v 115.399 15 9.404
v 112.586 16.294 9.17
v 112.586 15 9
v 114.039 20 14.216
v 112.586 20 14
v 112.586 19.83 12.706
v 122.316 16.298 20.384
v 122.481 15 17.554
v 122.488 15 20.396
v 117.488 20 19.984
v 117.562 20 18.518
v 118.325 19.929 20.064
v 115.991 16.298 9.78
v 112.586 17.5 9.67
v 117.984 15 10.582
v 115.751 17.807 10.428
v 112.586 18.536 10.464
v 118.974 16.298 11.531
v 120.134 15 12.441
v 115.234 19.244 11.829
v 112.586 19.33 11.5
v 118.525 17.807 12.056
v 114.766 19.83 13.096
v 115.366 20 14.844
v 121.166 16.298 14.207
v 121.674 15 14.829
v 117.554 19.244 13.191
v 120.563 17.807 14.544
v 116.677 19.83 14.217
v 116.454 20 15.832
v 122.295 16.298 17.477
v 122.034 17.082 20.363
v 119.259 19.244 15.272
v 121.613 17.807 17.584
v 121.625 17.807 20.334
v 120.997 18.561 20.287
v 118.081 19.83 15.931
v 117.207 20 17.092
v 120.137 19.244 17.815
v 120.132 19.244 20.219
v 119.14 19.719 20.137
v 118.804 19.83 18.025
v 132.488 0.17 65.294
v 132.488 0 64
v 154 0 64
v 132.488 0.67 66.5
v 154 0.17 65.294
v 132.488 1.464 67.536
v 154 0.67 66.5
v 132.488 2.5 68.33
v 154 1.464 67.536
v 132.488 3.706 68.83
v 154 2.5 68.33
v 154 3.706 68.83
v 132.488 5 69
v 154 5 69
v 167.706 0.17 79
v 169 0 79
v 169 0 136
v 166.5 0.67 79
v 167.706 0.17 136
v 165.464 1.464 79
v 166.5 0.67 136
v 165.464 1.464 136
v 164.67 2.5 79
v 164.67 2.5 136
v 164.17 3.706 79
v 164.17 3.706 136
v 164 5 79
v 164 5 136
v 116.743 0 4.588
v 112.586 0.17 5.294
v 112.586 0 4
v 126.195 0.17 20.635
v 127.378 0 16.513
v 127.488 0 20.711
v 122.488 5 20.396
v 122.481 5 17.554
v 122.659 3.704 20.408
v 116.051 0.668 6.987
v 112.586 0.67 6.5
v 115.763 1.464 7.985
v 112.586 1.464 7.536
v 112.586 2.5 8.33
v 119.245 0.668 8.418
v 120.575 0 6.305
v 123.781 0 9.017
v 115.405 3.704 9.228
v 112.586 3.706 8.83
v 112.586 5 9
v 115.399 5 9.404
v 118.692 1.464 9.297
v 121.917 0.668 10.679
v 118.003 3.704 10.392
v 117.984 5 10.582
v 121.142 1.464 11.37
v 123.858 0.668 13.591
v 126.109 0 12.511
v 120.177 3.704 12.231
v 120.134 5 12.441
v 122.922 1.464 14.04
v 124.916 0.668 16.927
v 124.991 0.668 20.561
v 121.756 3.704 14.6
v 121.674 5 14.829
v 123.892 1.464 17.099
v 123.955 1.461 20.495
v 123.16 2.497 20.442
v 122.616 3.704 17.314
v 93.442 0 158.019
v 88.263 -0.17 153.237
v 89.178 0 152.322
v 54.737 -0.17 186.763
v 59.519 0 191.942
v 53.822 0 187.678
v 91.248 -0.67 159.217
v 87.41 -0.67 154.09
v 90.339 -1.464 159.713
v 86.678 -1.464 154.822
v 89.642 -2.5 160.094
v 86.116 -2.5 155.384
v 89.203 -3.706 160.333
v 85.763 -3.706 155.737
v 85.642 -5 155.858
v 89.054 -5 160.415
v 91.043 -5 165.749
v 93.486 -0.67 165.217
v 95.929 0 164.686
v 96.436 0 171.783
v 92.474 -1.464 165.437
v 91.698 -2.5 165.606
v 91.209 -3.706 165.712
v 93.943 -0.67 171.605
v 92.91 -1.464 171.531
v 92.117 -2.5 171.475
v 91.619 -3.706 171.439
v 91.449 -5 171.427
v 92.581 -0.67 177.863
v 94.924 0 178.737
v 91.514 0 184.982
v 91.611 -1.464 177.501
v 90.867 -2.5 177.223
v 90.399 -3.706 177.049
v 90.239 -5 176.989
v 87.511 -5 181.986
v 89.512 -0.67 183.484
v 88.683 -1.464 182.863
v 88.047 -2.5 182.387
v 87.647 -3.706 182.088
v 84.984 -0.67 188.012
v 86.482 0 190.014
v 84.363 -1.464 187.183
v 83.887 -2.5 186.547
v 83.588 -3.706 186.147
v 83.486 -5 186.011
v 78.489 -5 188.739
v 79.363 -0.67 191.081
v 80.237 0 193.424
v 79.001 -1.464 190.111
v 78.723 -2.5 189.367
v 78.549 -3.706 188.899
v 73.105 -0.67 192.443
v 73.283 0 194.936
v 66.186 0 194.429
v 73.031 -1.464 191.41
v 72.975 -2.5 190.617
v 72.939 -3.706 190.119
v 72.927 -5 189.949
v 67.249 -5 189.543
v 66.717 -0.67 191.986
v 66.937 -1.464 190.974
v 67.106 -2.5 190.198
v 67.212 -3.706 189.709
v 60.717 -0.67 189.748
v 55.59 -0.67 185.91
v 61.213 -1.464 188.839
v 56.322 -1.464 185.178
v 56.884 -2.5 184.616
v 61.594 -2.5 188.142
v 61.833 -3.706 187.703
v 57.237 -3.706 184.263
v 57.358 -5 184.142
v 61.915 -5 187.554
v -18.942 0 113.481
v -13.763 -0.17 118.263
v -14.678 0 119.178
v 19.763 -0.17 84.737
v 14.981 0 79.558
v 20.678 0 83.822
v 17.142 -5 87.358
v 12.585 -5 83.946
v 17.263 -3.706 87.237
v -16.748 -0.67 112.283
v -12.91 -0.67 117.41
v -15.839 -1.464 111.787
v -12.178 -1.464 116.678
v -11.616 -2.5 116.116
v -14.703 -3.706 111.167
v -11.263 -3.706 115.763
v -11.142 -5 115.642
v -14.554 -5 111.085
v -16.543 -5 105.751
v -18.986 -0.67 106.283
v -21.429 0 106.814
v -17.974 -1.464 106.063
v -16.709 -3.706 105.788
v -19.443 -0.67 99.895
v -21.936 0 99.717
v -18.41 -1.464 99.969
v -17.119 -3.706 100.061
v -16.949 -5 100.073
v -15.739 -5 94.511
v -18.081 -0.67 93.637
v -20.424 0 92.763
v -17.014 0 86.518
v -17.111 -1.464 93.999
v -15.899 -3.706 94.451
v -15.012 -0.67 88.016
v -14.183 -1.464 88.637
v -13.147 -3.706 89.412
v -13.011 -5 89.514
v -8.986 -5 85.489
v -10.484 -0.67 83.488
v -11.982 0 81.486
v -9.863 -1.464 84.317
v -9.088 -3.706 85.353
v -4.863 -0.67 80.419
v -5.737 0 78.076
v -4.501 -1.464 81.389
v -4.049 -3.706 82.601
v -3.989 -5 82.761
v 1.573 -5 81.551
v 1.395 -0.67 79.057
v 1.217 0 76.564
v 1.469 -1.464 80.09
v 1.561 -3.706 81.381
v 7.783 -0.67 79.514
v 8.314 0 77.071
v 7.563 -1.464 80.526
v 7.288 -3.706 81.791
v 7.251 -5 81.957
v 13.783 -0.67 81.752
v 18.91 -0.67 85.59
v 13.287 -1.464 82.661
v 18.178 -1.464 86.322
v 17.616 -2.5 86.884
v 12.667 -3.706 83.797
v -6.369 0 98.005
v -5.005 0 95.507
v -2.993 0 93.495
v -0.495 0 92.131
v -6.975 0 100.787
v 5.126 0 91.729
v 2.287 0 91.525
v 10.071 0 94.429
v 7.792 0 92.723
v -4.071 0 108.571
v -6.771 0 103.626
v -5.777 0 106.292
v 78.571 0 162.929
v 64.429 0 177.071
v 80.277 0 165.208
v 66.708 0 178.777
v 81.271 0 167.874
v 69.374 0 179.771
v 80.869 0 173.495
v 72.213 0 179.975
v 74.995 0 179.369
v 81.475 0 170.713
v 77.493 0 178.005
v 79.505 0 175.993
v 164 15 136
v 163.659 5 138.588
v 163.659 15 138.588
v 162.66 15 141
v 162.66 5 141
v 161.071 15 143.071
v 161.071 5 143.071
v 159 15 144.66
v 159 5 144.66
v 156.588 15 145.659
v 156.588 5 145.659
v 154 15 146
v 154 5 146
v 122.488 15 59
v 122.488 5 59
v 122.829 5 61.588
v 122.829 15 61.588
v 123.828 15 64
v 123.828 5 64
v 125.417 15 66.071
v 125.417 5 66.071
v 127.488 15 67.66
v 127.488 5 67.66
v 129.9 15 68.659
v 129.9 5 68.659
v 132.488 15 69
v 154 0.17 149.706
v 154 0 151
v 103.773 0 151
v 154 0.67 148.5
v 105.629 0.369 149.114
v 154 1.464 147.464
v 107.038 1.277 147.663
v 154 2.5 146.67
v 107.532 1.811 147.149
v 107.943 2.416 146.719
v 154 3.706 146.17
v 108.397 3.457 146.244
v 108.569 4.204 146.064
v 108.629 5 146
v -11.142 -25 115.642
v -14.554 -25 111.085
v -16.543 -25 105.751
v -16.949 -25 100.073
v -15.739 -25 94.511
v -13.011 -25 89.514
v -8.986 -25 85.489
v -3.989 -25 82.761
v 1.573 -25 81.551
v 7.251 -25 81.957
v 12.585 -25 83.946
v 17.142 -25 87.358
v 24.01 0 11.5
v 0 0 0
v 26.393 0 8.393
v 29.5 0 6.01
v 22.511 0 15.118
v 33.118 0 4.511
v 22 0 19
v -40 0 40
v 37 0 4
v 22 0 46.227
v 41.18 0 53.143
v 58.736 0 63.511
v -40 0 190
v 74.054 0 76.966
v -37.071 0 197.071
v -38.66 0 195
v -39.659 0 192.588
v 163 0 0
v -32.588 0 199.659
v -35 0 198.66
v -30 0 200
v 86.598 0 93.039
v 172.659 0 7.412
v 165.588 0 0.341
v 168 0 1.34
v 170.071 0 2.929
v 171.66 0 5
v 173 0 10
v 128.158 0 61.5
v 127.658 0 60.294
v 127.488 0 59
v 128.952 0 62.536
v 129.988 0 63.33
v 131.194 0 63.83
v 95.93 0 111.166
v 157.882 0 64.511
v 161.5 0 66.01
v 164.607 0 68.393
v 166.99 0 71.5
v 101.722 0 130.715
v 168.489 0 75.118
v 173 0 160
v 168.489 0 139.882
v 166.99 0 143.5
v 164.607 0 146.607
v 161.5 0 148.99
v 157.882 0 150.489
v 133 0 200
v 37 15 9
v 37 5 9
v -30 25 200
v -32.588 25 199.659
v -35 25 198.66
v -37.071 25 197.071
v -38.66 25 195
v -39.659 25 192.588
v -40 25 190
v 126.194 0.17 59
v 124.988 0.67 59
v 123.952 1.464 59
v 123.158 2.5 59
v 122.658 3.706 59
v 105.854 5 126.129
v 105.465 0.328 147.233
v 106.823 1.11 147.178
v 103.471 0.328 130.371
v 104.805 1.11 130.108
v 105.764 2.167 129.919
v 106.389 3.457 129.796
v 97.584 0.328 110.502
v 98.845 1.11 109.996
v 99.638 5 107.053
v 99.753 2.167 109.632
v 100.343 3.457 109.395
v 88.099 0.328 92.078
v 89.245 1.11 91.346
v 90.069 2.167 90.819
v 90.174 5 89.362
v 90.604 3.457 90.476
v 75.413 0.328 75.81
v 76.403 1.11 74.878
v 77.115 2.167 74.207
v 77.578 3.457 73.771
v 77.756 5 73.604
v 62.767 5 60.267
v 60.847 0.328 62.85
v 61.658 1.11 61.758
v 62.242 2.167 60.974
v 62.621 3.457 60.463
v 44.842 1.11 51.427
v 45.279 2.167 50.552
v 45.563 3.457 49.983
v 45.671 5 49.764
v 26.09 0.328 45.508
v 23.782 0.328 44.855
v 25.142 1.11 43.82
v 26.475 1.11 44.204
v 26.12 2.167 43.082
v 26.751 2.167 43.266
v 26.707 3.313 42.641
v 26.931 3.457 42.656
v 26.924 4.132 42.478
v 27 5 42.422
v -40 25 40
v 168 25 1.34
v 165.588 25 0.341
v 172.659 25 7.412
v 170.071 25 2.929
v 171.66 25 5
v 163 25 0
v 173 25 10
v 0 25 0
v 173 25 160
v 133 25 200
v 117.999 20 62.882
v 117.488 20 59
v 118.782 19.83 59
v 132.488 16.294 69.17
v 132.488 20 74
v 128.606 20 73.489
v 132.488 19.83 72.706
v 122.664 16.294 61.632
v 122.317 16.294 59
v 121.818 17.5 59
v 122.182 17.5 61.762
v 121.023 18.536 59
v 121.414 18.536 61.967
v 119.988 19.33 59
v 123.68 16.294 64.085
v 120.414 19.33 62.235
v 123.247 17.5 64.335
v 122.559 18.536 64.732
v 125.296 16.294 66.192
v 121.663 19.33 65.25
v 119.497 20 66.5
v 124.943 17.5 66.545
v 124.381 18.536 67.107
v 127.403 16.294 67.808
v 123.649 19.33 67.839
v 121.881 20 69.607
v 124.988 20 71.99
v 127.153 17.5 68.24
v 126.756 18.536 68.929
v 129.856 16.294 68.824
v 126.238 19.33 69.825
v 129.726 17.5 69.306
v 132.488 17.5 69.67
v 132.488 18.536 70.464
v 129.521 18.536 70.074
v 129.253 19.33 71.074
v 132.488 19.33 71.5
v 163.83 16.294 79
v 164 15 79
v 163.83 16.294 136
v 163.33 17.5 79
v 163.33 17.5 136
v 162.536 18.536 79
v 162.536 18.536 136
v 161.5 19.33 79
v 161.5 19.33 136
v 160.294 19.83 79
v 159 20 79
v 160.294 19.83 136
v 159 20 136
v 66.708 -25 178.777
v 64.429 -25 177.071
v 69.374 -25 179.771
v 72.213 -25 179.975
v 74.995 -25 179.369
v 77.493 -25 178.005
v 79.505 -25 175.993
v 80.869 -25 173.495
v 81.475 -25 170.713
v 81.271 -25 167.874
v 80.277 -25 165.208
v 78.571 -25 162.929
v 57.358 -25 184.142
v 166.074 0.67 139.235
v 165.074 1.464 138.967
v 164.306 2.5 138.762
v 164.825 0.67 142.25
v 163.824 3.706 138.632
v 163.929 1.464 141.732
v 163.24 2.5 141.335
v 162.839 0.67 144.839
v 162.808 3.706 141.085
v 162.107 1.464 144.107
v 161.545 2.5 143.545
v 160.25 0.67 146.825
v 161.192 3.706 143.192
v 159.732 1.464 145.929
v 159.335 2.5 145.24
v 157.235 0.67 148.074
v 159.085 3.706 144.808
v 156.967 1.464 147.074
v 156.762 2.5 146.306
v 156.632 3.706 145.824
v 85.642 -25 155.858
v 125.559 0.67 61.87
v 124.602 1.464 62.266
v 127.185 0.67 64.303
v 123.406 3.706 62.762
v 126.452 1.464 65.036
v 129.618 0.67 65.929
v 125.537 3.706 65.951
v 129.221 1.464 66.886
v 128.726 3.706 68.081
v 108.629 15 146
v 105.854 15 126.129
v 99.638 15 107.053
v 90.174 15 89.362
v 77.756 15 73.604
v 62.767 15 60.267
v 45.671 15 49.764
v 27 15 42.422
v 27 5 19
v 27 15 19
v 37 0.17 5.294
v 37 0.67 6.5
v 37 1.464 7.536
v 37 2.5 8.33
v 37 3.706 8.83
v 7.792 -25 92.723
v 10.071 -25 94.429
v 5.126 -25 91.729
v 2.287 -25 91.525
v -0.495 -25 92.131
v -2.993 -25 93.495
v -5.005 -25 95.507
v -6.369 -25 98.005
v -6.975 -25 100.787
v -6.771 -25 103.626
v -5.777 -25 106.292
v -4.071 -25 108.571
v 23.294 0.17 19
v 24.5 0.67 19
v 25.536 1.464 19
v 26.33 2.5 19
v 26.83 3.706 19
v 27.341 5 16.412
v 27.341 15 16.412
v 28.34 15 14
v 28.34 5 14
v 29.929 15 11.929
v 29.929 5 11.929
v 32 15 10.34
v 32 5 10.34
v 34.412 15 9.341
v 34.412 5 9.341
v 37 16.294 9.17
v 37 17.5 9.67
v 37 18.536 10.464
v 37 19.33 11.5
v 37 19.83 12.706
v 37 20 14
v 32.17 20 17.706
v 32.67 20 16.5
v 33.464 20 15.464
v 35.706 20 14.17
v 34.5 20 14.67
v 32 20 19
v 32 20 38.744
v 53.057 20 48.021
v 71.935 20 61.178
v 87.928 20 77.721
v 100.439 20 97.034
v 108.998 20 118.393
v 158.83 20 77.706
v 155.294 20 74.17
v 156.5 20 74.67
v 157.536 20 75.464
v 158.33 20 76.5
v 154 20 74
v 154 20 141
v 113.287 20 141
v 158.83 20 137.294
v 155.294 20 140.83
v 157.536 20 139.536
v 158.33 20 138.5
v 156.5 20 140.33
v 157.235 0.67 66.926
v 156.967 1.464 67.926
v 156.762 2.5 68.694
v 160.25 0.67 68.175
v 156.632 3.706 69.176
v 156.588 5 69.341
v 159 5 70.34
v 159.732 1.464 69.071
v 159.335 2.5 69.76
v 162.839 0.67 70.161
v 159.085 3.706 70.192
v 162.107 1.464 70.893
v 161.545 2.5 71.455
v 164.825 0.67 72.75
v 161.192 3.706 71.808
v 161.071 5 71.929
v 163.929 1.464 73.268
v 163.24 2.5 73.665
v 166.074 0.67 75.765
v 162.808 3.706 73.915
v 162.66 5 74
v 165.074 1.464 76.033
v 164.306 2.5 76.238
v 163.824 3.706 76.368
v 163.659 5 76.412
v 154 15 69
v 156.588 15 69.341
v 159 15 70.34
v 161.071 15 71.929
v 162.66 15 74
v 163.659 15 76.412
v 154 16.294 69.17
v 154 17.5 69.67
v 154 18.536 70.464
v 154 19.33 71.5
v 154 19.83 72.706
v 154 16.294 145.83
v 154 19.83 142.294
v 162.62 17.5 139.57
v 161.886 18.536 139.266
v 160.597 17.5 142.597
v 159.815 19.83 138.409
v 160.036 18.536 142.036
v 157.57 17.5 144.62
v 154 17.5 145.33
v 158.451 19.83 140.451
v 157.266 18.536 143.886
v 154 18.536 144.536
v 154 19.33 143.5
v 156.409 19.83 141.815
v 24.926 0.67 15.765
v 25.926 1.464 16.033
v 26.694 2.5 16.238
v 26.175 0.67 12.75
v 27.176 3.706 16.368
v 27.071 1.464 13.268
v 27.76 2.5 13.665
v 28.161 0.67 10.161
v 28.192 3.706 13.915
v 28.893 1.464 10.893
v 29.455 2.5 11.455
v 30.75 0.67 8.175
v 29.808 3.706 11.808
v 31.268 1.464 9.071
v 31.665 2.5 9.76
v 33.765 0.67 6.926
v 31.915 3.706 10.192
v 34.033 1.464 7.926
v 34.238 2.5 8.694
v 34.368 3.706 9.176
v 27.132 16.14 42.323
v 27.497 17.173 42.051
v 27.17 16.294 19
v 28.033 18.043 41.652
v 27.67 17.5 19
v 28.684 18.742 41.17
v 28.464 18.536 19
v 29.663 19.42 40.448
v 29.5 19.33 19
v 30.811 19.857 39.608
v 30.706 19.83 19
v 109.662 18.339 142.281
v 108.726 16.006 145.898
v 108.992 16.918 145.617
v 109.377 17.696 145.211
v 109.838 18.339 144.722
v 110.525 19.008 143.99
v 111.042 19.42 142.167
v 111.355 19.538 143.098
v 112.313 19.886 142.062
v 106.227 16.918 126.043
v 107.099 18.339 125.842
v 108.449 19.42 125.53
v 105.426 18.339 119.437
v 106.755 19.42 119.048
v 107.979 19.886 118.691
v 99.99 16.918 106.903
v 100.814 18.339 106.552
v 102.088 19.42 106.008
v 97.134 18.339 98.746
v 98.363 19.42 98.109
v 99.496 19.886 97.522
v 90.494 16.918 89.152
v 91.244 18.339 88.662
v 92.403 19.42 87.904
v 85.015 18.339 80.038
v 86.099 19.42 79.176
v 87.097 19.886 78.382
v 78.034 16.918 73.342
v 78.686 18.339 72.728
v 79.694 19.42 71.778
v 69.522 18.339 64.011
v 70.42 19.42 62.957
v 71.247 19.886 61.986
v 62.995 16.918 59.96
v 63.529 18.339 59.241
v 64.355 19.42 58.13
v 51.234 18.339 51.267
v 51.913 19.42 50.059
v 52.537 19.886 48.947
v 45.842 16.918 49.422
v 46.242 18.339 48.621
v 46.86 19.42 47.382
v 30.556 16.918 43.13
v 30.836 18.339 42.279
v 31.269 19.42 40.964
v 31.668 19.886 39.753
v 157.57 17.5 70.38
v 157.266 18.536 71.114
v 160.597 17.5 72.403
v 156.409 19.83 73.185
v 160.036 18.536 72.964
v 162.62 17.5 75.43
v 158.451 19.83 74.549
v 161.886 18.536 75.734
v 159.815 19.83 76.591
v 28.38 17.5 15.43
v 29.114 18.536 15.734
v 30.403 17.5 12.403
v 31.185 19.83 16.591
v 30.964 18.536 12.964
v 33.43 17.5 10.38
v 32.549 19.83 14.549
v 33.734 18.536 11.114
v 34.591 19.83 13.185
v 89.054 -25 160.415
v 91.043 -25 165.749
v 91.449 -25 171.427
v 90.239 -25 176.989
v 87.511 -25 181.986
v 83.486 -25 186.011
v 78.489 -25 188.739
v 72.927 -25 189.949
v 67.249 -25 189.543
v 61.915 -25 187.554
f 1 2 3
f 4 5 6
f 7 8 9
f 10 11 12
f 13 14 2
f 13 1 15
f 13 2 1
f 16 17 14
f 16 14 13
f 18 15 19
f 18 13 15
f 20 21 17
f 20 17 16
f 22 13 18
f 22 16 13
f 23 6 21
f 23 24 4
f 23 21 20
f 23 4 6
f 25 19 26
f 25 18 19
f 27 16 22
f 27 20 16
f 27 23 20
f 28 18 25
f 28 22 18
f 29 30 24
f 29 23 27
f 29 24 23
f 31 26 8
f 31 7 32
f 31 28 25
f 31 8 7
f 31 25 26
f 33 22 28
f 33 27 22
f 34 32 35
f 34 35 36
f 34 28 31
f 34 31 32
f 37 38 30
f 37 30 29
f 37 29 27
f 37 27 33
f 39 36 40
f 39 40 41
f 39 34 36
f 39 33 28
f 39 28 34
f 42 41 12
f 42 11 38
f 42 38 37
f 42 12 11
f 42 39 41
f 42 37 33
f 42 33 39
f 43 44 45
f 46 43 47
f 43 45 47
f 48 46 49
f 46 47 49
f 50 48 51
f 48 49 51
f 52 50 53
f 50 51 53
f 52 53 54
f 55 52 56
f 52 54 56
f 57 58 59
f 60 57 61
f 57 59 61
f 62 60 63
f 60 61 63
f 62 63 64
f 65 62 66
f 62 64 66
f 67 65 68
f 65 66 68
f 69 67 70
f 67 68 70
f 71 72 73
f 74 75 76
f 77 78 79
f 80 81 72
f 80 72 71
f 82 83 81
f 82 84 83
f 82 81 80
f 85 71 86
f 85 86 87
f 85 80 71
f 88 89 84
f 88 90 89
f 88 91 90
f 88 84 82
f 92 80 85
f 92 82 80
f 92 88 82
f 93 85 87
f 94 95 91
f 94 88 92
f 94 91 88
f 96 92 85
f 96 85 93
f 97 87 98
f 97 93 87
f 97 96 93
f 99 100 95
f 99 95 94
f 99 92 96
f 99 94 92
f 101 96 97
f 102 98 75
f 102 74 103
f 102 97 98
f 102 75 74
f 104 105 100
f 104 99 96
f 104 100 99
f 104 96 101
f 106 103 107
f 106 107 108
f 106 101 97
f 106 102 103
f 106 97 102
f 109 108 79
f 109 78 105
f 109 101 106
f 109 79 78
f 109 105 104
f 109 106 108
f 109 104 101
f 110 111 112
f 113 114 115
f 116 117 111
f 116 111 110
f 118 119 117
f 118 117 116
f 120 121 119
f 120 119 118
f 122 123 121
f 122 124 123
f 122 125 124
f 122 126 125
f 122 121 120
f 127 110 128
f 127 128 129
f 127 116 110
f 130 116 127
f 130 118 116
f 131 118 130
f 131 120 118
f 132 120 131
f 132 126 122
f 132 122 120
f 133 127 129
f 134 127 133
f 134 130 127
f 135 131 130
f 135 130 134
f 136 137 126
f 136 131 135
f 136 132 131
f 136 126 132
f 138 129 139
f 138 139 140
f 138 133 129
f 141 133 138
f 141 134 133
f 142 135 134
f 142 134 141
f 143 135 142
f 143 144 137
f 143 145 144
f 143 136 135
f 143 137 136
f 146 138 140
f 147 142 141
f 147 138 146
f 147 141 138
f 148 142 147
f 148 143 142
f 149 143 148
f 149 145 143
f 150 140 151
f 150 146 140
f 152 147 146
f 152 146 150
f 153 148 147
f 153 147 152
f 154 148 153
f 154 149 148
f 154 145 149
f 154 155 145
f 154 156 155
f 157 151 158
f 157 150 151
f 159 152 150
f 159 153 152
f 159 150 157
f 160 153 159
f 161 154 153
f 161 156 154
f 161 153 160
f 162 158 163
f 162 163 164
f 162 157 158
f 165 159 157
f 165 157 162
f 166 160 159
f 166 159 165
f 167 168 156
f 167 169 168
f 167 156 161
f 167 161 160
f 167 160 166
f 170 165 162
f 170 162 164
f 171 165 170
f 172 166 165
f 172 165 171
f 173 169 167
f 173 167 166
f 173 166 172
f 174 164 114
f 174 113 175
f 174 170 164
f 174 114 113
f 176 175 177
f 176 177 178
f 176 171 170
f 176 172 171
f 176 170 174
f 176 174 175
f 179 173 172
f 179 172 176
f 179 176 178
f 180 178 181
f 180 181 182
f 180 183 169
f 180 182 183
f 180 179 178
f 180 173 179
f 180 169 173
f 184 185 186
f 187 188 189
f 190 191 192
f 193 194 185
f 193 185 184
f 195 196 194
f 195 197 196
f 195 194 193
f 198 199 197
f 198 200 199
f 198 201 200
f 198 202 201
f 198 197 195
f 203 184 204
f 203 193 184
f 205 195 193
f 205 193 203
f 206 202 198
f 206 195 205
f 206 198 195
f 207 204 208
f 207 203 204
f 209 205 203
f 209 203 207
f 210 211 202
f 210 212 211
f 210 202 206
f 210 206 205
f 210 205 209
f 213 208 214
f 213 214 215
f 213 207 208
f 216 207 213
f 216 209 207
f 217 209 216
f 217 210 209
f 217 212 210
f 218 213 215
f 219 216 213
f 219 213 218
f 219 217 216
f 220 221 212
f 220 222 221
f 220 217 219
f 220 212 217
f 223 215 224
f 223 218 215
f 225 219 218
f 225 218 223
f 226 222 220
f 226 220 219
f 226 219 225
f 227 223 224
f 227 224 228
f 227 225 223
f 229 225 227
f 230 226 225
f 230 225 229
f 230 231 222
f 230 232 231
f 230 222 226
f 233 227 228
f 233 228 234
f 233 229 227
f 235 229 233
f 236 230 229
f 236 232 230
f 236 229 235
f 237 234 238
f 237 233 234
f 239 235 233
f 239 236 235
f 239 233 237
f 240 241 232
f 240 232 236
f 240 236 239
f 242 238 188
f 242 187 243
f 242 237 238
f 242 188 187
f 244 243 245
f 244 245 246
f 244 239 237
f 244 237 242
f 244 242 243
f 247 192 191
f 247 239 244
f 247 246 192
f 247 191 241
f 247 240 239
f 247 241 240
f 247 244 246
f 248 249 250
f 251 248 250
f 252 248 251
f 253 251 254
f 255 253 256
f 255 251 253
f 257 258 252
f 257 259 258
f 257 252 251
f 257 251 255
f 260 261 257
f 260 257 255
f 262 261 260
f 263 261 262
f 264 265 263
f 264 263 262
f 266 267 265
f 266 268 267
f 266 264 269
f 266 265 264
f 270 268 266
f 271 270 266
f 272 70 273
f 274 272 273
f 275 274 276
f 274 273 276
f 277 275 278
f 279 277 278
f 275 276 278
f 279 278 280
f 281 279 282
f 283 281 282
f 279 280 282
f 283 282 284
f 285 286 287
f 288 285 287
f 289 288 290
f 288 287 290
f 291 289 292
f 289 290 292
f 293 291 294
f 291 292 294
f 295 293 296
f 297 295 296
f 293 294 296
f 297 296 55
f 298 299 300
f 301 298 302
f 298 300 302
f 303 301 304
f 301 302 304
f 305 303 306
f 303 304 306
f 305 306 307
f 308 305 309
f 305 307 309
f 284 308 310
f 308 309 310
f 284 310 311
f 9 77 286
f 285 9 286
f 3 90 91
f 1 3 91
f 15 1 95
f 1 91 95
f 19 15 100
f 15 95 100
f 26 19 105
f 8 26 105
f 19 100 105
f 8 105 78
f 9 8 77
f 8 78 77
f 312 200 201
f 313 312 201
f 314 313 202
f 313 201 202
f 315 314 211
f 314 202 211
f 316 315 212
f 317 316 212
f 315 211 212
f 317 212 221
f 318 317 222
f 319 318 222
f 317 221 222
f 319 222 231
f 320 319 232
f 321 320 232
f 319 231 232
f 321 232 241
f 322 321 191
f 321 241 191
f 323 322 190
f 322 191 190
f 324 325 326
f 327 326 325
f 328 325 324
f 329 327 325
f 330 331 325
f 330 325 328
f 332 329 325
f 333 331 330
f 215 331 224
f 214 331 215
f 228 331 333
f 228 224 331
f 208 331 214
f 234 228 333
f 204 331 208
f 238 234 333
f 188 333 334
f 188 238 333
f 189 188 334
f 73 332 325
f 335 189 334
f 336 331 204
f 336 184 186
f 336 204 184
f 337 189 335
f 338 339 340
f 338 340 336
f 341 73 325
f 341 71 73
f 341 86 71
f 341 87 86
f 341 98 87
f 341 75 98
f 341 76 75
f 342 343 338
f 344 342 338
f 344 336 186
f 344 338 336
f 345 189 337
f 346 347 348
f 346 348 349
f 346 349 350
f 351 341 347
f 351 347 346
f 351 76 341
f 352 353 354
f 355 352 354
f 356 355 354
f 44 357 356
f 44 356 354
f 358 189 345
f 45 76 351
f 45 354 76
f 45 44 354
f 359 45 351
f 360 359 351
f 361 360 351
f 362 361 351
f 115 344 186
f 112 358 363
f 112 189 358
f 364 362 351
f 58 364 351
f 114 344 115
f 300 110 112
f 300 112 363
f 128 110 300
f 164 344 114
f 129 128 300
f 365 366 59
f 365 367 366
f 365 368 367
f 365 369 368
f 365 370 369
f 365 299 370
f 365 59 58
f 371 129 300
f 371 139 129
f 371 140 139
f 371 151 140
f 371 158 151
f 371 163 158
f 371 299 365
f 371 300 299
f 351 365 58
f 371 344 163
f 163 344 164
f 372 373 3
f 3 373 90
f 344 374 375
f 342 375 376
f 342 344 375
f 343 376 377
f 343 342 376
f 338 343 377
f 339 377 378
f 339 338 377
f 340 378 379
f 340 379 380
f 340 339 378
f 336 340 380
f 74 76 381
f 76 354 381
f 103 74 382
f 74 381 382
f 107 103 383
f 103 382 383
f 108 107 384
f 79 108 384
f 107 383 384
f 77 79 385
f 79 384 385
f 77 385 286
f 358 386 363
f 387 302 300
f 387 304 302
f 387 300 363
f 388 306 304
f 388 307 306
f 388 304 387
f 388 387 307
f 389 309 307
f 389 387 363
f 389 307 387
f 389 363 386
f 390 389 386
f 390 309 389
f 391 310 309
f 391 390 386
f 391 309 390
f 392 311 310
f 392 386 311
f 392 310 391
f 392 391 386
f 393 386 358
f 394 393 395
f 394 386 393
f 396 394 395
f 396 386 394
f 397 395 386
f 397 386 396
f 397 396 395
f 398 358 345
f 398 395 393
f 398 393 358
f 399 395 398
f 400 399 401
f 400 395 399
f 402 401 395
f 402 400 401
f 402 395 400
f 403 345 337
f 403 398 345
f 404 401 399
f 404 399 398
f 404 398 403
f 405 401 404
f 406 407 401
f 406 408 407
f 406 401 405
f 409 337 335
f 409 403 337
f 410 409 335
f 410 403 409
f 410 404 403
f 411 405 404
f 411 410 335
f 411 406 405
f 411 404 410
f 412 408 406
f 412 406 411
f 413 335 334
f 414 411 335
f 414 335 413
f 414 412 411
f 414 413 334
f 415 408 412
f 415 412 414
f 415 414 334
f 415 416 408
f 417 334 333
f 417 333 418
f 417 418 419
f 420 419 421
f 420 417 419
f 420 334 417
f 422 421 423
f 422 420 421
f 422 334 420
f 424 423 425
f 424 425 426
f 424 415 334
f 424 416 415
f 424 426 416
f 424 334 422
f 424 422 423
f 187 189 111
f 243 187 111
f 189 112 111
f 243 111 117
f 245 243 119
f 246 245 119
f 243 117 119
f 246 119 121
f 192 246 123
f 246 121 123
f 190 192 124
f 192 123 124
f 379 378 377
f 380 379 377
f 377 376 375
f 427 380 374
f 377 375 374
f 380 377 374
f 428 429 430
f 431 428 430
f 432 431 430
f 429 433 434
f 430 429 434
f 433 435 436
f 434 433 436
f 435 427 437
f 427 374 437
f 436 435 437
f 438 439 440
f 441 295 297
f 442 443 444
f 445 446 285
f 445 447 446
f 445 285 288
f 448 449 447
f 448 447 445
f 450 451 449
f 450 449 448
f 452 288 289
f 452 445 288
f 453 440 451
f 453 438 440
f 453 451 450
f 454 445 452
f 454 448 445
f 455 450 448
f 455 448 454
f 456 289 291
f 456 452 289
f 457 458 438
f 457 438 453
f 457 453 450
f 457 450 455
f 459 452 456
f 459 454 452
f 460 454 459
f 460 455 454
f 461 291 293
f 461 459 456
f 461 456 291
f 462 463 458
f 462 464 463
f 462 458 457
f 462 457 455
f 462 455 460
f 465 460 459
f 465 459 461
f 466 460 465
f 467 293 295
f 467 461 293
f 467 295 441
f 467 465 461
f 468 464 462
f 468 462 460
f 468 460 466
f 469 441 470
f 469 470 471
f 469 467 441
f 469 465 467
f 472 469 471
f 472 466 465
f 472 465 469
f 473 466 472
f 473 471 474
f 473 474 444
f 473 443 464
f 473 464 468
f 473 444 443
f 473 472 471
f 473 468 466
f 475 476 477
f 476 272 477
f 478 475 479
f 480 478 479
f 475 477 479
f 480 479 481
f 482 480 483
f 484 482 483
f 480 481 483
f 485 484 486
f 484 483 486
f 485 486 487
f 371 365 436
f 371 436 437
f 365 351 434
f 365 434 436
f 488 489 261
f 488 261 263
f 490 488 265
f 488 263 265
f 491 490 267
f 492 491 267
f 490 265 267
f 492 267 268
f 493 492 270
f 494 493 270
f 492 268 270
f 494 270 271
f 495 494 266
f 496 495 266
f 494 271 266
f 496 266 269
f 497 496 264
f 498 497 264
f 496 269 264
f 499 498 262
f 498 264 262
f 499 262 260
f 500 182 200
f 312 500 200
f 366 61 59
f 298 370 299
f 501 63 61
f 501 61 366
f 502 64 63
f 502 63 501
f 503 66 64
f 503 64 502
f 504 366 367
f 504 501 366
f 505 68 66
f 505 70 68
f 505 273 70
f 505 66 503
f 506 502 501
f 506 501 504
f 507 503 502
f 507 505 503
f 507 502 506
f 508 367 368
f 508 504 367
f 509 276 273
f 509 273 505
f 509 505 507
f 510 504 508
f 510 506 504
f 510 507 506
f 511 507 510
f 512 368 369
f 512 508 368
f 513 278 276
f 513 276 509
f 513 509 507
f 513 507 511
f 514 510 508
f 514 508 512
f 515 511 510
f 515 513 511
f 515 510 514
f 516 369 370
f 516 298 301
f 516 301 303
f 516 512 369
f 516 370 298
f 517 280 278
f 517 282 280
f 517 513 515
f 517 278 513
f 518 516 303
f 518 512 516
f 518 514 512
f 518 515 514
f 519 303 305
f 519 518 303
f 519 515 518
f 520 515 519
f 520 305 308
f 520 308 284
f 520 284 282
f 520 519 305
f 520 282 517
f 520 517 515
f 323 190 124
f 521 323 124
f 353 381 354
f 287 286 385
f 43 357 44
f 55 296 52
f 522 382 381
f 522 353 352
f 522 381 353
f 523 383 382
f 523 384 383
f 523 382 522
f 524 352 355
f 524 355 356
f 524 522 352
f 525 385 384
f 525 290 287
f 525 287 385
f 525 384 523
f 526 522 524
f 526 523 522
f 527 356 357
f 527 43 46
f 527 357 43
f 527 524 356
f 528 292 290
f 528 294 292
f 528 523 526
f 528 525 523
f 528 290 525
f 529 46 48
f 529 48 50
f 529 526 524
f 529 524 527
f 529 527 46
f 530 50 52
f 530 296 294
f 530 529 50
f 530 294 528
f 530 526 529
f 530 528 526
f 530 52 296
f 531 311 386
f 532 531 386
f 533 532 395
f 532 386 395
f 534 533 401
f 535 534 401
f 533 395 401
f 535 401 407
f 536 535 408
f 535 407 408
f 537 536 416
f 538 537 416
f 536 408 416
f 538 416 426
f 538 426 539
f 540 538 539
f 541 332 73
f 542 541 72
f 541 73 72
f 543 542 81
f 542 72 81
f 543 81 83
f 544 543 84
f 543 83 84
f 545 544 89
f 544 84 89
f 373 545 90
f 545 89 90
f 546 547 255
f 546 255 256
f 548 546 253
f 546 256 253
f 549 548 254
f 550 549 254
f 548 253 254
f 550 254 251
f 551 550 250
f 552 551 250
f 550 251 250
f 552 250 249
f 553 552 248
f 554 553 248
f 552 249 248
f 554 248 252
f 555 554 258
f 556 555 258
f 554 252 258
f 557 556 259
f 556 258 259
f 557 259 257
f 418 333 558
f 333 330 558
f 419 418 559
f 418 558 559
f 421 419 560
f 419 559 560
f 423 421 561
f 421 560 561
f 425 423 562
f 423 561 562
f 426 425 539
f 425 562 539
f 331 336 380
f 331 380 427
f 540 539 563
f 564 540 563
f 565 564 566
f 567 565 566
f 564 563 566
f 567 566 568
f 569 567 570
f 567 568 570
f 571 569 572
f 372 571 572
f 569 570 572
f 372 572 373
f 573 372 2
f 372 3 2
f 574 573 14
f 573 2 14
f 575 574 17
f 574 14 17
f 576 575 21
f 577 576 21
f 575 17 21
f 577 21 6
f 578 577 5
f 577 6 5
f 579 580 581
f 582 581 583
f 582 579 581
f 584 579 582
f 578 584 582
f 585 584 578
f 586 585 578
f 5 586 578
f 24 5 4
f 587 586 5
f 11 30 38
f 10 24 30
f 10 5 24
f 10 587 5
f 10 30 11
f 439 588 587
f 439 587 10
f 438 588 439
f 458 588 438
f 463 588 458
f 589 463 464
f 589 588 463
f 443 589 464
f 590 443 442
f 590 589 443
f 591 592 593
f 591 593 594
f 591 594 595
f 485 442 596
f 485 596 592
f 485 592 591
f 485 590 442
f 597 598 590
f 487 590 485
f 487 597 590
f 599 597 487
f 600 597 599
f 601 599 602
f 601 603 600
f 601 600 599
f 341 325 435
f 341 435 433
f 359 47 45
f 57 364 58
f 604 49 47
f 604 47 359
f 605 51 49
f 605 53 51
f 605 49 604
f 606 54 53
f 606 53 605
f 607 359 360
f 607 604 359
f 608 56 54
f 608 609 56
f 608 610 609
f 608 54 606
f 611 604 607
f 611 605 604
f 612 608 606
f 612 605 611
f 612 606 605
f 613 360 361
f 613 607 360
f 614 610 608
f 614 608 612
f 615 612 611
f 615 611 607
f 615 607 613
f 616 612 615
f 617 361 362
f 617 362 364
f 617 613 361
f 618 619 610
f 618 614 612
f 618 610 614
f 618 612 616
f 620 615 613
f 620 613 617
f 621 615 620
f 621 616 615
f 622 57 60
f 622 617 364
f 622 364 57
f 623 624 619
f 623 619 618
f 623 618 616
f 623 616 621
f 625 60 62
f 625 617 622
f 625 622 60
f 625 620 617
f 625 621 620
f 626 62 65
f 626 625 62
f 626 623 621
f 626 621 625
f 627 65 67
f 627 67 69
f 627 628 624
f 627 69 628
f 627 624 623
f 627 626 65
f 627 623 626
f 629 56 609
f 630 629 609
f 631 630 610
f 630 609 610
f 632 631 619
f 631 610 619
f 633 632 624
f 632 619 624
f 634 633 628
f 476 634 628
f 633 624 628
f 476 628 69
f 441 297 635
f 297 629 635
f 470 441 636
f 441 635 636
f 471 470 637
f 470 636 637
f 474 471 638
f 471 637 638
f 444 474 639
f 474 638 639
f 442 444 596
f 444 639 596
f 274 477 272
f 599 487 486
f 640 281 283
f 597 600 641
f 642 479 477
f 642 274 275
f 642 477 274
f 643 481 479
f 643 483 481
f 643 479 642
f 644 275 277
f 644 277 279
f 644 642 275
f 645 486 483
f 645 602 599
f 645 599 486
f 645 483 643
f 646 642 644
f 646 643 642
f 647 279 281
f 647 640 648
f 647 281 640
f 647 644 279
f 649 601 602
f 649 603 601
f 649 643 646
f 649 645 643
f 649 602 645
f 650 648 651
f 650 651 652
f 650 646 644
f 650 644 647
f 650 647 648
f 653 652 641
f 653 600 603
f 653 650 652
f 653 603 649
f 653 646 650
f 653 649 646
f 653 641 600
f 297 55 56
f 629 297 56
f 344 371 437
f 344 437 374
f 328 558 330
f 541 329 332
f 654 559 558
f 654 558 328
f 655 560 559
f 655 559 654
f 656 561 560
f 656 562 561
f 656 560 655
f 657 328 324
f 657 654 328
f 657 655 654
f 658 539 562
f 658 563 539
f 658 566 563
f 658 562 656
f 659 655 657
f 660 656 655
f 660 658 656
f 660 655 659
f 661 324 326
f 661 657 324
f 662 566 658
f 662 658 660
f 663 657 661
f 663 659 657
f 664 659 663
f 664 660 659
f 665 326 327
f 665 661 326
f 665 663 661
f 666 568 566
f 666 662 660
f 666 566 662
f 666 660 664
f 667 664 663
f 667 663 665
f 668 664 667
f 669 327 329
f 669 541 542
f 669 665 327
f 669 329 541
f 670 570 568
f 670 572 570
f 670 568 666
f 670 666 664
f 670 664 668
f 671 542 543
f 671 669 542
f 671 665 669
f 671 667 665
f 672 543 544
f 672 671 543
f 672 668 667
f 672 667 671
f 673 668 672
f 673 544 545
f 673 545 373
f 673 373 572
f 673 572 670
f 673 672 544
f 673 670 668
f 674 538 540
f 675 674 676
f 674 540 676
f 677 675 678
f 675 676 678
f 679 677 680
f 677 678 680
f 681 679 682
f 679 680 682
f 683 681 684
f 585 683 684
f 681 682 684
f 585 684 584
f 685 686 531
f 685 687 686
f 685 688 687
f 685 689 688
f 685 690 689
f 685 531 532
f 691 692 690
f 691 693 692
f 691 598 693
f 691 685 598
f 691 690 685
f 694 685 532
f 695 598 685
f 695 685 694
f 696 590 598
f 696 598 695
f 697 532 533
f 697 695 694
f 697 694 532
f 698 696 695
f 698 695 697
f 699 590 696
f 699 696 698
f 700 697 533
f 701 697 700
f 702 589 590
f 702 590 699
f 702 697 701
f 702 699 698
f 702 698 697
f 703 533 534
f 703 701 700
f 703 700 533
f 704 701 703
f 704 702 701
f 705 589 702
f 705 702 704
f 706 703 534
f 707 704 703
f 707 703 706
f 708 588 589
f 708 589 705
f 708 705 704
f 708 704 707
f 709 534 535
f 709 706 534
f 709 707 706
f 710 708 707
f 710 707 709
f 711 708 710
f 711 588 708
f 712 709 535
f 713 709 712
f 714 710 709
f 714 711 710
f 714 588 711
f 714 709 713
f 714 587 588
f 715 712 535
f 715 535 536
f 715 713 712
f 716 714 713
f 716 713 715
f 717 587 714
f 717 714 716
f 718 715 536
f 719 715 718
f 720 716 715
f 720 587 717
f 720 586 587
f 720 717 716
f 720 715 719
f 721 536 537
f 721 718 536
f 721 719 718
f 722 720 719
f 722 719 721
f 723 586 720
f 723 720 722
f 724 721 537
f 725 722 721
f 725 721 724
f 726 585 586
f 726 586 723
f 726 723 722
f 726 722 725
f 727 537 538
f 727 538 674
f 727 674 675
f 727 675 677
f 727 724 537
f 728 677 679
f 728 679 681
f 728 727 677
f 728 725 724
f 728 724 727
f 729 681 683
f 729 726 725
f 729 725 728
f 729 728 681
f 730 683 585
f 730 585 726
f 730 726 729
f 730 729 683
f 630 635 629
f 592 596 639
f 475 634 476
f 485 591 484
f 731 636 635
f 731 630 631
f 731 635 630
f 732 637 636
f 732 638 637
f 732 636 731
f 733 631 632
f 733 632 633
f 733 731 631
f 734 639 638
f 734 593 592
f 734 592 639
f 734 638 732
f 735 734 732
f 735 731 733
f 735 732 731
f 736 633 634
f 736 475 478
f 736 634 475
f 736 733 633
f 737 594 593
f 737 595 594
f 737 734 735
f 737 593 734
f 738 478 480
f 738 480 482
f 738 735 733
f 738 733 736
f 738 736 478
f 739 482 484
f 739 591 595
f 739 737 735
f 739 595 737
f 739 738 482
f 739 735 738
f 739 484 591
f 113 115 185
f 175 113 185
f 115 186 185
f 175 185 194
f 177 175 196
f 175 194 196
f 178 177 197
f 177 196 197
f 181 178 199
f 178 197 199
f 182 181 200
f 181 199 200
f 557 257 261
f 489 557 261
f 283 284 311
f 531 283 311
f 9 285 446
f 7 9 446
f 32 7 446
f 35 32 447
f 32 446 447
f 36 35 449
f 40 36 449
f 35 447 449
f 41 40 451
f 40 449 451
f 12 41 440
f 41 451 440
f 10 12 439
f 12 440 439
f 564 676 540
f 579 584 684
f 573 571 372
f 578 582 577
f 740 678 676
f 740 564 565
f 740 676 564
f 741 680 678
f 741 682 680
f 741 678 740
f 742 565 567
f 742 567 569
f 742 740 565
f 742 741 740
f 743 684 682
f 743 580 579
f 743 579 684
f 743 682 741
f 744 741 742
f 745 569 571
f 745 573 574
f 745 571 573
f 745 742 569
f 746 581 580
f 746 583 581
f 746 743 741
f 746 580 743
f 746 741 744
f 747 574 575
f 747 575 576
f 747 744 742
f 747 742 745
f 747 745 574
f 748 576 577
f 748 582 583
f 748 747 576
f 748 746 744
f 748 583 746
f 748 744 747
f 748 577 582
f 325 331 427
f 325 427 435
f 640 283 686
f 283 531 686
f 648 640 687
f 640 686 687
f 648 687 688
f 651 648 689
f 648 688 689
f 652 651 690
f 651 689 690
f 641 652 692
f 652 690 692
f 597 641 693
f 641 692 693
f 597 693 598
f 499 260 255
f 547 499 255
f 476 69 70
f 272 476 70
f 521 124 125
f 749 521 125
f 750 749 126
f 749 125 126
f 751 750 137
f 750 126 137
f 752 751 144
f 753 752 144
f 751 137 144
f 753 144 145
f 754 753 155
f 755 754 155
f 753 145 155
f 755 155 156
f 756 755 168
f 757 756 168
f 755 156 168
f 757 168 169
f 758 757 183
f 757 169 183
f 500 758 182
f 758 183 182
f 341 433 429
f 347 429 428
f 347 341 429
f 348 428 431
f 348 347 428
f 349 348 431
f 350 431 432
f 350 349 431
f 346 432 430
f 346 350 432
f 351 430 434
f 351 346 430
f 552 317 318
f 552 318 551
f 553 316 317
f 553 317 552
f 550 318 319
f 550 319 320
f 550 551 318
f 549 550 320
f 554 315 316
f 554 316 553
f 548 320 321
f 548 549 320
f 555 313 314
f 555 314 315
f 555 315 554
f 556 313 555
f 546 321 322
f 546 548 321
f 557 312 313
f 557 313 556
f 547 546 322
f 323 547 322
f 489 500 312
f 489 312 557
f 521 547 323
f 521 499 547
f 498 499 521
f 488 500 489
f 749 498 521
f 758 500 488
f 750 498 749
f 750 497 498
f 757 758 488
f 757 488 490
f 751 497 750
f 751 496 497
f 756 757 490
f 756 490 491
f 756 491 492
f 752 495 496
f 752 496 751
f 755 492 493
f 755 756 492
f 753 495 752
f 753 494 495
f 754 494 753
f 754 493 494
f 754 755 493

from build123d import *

# Parameters (mm, degrees)
F1_DEPTH = 25
F2_DEPTH = 25
F3_DEPTH = 20
F4_R     = 5


with BuildPart() as f1:
    # F0 (on Front) → F1 (new body)
    with BuildSketch(Plane.XZ):
        with BuildLine():
            Line((-40, 40), (0, 0))
            Line((0, 0), (163, 0))
            ThreePointArc((163, 0), (170.071068, 2.928932), (173, 10))
            Line((173, 10), (173, 160))
            Line((173, 160), (133, 200))
            Line((133, 200), (-30, 200))
            ThreePointArc((-30, 200), (-37.071068, 197.071068), (-40, 190))
            Line((-40, 190), (-40, 40))
        make_face()
        with BuildLine():
            Line((112.58571, 9), (37, 9))
            ThreePointArc((37, 9), (29.928932, 11.928932), (27, 19))
            Line((27, 19), (27, 42.421554))
            ThreePointArc((27, 42.421554), (84.312311, 81.209106), (108.629286, 146))
            Line((108.629286, 146), (154, 146))
            ThreePointArc((154, 146), (161.071068, 143.071068), (164, 136))
            Line((164, 136), (164, 79))
            ThreePointArc((164, 79), (161.071068, 71.928932), (154, 69))
            Line((154, 69), (132.48784, 69))
            ThreePointArc((132.48784, 69), (125.416772, 66.071068), (122.48784, 59))
            Line((122.48784, 59), (122.48784, 20.395643))
            ThreePointArc((122.48784, 20.395643), (120.134101, 12.4409), (112.58571, 9))
        make_face(mode=Mode.SUBTRACT)
        with BuildLine():
            ThreePointArc((17.142136, 87.357864), (-11.142136, 87.357864), (-11.142136, 115.642136))
            Line((-11.142136, 115.642136), (57.357864, 184.142136))
            ThreePointArc((57.357864, 184.142136), (85.642136, 184.142136), (85.642136, 155.857864))
            Line((85.642136, 155.857864), (17.142136, 87.357864))
        make_face(mode=Mode.SUBTRACT)
        with BuildLine():
            ThreePointArc((27, 19), (29.928932, 11.928932), (37, 9))
            Line((37, 9), (112.58571, 9))
            ThreePointArc((112.58571, 9), (120.134101, 12.4409), (122.48784, 20.395643))
            Line((122.48784, 20.395643), (122.48784, 59))
            ThreePointArc((122.48784, 59), (125.416772, 66.071068), (132.48784, 69))
            Line((132.48784, 69), (154, 69))
            ThreePointArc((154, 69), (161.071068, 71.928932), (164, 79))
            Line((164, 79), (164, 136))
            ThreePointArc((164, 136), (161.071068, 143.071068), (154, 146))
            Line((154, 146), (108.629286, 146))
            ThreePointArc((108.629286, 146), (84.312311, 81.209106), (27, 42.421554))
            Line((27, 42.421554), (27, 19))
        make_face()
        with BuildLine():
            Line((57.357864, 184.142136), (-11.142136, 115.642136))
            ThreePointArc((-11.142136, 115.642136), (-11.142136, 87.357864), (17.142136, 87.357864))
            Line((17.142136, 87.357864), (85.642136, 155.857864))
            ThreePointArc((85.642136, 155.857864), (85.642136, 184.142136), (57.357864, 184.142136))
        make_face()
        with BuildLine():
            ThreePointArc((64.428932, 177.071068), (78.571068, 177.071068), (78.571068, 162.928932))
            Line((78.571068, 162.928932), (66.323619, 150.681483))
            Line((66.323619, 150.681483), (10.071068, 94.428932))
            ThreePointArc((10.071068, 94.428932), (-4.071068, 94.428932), (-4.071068, 108.571068))
            Line((-4.071068, 108.571068), (52.181483, 164.823619))
            Line((52.181483, 164.823619), (64.428932, 177.071068))
        make_face(mode=Mode.SUBTRACT)
        with BuildLine():
            Line((10.071068, 94.428932), (66.323619, 150.681483))
            ThreePointArc((66.323619, 150.681483), (57.357864, 155.857864), (52.181483, 164.823619))
            Line((52.181483, 164.823619), (-4.071068, 108.571068))
            ThreePointArc((-4.071068, 108.571068), (-4.071068, 94.428932), (10.071068, 94.428932))
        make_face()
        with BuildLine():
            Line((66.323619, 150.681483), (78.571068, 162.928932))
            ThreePointArc((78.571068, 162.928932), (78.571068, 177.071068), (64.428932, 177.071068))
            Line((64.428932, 177.071068), (52.181483, 164.823619))
            ThreePointArc((52.181483, 164.823619), (57.357864, 155.857864), (66.323619, 150.681483))
        make_face()
    extrude(amount=-F1_DEPTH)

    # F0 (on Front) → F2 (join)
    with BuildSketch(Plane.XZ):
        with BuildLine():
            Line((57.357864, 184.142136), (-11.142136, 115.642136))
            ThreePointArc((-11.142136, 115.642136), (-11.142136, 87.357864), (17.142136, 87.357864))
            Line((17.142136, 87.357864), (85.642136, 155.857864))
            ThreePointArc((85.642136, 155.857864), (85.642136, 184.142136), (57.357864, 184.142136))
        make_face()
        with BuildLine():
            ThreePointArc((64.428932, 177.071068), (78.571068, 177.071068), (78.571068, 162.928932))
            Line((78.571068, 162.928932), (66.323619, 150.681483))
            Line((66.323619, 150.681483), (10.071068, 94.428932))
            ThreePointArc((10.071068, 94.428932), (-4.071068, 94.428932), (-4.071068, 108.571068))
            Line((-4.071068, 108.571068), (52.181483, 164.823619))
            Line((52.181483, 164.823619), (64.428932, 177.071068))
        make_face(mode=Mode.SUBTRACT)
    extrude(amount=F2_DEPTH)

    # F0 (on Front) → F3 (cut)
    with BuildSketch(Plane.XZ):
        with BuildLine():
            ThreePointArc((27, 19), (29.928932, 11.928932), (37, 9))
            Line((37, 9), (112.58571, 9))
            ThreePointArc((112.58571, 9), (120.134101, 12.4409), (122.48784, 20.395643))
            Line((122.48784, 20.395643), (122.48784, 59))
            ThreePointArc((122.48784, 59), (125.416772, 66.071068), (132.48784, 69))
            Line((132.48784, 69), (154, 69))
            ThreePointArc((154, 69), (161.071068, 71.928932), (164, 79))
            Line((164, 79), (164, 136))
            ThreePointArc((164, 136), (161.071068, 143.071068), (154, 146))
            Line((154, 146), (108.629286, 146))
            ThreePointArc((108.629286, 146), (84.312311, 81.209106), (27, 42.421554))
            Line((27, 42.421554), (27, 19))
        make_face()
    extrude(amount=-F3_DEPTH, mode=Mode.SUBTRACT)

    # F4
    f4_edges = [f1.edges().sort_by_distance(p)[0] for p in [
        (51.392136, 0, 121.607864),
        (84.312311, 0, 81.209106),
        (84.312311, 20, 81.209106),
        (131.314643, 20, 146),
        (131.314643, 0, 146),
        (27, 0, 30.710777),
        (27, 20, 30.710777),
    ]]
    fillet(f4_edges, radius=F4_R)


solid = f1.part
